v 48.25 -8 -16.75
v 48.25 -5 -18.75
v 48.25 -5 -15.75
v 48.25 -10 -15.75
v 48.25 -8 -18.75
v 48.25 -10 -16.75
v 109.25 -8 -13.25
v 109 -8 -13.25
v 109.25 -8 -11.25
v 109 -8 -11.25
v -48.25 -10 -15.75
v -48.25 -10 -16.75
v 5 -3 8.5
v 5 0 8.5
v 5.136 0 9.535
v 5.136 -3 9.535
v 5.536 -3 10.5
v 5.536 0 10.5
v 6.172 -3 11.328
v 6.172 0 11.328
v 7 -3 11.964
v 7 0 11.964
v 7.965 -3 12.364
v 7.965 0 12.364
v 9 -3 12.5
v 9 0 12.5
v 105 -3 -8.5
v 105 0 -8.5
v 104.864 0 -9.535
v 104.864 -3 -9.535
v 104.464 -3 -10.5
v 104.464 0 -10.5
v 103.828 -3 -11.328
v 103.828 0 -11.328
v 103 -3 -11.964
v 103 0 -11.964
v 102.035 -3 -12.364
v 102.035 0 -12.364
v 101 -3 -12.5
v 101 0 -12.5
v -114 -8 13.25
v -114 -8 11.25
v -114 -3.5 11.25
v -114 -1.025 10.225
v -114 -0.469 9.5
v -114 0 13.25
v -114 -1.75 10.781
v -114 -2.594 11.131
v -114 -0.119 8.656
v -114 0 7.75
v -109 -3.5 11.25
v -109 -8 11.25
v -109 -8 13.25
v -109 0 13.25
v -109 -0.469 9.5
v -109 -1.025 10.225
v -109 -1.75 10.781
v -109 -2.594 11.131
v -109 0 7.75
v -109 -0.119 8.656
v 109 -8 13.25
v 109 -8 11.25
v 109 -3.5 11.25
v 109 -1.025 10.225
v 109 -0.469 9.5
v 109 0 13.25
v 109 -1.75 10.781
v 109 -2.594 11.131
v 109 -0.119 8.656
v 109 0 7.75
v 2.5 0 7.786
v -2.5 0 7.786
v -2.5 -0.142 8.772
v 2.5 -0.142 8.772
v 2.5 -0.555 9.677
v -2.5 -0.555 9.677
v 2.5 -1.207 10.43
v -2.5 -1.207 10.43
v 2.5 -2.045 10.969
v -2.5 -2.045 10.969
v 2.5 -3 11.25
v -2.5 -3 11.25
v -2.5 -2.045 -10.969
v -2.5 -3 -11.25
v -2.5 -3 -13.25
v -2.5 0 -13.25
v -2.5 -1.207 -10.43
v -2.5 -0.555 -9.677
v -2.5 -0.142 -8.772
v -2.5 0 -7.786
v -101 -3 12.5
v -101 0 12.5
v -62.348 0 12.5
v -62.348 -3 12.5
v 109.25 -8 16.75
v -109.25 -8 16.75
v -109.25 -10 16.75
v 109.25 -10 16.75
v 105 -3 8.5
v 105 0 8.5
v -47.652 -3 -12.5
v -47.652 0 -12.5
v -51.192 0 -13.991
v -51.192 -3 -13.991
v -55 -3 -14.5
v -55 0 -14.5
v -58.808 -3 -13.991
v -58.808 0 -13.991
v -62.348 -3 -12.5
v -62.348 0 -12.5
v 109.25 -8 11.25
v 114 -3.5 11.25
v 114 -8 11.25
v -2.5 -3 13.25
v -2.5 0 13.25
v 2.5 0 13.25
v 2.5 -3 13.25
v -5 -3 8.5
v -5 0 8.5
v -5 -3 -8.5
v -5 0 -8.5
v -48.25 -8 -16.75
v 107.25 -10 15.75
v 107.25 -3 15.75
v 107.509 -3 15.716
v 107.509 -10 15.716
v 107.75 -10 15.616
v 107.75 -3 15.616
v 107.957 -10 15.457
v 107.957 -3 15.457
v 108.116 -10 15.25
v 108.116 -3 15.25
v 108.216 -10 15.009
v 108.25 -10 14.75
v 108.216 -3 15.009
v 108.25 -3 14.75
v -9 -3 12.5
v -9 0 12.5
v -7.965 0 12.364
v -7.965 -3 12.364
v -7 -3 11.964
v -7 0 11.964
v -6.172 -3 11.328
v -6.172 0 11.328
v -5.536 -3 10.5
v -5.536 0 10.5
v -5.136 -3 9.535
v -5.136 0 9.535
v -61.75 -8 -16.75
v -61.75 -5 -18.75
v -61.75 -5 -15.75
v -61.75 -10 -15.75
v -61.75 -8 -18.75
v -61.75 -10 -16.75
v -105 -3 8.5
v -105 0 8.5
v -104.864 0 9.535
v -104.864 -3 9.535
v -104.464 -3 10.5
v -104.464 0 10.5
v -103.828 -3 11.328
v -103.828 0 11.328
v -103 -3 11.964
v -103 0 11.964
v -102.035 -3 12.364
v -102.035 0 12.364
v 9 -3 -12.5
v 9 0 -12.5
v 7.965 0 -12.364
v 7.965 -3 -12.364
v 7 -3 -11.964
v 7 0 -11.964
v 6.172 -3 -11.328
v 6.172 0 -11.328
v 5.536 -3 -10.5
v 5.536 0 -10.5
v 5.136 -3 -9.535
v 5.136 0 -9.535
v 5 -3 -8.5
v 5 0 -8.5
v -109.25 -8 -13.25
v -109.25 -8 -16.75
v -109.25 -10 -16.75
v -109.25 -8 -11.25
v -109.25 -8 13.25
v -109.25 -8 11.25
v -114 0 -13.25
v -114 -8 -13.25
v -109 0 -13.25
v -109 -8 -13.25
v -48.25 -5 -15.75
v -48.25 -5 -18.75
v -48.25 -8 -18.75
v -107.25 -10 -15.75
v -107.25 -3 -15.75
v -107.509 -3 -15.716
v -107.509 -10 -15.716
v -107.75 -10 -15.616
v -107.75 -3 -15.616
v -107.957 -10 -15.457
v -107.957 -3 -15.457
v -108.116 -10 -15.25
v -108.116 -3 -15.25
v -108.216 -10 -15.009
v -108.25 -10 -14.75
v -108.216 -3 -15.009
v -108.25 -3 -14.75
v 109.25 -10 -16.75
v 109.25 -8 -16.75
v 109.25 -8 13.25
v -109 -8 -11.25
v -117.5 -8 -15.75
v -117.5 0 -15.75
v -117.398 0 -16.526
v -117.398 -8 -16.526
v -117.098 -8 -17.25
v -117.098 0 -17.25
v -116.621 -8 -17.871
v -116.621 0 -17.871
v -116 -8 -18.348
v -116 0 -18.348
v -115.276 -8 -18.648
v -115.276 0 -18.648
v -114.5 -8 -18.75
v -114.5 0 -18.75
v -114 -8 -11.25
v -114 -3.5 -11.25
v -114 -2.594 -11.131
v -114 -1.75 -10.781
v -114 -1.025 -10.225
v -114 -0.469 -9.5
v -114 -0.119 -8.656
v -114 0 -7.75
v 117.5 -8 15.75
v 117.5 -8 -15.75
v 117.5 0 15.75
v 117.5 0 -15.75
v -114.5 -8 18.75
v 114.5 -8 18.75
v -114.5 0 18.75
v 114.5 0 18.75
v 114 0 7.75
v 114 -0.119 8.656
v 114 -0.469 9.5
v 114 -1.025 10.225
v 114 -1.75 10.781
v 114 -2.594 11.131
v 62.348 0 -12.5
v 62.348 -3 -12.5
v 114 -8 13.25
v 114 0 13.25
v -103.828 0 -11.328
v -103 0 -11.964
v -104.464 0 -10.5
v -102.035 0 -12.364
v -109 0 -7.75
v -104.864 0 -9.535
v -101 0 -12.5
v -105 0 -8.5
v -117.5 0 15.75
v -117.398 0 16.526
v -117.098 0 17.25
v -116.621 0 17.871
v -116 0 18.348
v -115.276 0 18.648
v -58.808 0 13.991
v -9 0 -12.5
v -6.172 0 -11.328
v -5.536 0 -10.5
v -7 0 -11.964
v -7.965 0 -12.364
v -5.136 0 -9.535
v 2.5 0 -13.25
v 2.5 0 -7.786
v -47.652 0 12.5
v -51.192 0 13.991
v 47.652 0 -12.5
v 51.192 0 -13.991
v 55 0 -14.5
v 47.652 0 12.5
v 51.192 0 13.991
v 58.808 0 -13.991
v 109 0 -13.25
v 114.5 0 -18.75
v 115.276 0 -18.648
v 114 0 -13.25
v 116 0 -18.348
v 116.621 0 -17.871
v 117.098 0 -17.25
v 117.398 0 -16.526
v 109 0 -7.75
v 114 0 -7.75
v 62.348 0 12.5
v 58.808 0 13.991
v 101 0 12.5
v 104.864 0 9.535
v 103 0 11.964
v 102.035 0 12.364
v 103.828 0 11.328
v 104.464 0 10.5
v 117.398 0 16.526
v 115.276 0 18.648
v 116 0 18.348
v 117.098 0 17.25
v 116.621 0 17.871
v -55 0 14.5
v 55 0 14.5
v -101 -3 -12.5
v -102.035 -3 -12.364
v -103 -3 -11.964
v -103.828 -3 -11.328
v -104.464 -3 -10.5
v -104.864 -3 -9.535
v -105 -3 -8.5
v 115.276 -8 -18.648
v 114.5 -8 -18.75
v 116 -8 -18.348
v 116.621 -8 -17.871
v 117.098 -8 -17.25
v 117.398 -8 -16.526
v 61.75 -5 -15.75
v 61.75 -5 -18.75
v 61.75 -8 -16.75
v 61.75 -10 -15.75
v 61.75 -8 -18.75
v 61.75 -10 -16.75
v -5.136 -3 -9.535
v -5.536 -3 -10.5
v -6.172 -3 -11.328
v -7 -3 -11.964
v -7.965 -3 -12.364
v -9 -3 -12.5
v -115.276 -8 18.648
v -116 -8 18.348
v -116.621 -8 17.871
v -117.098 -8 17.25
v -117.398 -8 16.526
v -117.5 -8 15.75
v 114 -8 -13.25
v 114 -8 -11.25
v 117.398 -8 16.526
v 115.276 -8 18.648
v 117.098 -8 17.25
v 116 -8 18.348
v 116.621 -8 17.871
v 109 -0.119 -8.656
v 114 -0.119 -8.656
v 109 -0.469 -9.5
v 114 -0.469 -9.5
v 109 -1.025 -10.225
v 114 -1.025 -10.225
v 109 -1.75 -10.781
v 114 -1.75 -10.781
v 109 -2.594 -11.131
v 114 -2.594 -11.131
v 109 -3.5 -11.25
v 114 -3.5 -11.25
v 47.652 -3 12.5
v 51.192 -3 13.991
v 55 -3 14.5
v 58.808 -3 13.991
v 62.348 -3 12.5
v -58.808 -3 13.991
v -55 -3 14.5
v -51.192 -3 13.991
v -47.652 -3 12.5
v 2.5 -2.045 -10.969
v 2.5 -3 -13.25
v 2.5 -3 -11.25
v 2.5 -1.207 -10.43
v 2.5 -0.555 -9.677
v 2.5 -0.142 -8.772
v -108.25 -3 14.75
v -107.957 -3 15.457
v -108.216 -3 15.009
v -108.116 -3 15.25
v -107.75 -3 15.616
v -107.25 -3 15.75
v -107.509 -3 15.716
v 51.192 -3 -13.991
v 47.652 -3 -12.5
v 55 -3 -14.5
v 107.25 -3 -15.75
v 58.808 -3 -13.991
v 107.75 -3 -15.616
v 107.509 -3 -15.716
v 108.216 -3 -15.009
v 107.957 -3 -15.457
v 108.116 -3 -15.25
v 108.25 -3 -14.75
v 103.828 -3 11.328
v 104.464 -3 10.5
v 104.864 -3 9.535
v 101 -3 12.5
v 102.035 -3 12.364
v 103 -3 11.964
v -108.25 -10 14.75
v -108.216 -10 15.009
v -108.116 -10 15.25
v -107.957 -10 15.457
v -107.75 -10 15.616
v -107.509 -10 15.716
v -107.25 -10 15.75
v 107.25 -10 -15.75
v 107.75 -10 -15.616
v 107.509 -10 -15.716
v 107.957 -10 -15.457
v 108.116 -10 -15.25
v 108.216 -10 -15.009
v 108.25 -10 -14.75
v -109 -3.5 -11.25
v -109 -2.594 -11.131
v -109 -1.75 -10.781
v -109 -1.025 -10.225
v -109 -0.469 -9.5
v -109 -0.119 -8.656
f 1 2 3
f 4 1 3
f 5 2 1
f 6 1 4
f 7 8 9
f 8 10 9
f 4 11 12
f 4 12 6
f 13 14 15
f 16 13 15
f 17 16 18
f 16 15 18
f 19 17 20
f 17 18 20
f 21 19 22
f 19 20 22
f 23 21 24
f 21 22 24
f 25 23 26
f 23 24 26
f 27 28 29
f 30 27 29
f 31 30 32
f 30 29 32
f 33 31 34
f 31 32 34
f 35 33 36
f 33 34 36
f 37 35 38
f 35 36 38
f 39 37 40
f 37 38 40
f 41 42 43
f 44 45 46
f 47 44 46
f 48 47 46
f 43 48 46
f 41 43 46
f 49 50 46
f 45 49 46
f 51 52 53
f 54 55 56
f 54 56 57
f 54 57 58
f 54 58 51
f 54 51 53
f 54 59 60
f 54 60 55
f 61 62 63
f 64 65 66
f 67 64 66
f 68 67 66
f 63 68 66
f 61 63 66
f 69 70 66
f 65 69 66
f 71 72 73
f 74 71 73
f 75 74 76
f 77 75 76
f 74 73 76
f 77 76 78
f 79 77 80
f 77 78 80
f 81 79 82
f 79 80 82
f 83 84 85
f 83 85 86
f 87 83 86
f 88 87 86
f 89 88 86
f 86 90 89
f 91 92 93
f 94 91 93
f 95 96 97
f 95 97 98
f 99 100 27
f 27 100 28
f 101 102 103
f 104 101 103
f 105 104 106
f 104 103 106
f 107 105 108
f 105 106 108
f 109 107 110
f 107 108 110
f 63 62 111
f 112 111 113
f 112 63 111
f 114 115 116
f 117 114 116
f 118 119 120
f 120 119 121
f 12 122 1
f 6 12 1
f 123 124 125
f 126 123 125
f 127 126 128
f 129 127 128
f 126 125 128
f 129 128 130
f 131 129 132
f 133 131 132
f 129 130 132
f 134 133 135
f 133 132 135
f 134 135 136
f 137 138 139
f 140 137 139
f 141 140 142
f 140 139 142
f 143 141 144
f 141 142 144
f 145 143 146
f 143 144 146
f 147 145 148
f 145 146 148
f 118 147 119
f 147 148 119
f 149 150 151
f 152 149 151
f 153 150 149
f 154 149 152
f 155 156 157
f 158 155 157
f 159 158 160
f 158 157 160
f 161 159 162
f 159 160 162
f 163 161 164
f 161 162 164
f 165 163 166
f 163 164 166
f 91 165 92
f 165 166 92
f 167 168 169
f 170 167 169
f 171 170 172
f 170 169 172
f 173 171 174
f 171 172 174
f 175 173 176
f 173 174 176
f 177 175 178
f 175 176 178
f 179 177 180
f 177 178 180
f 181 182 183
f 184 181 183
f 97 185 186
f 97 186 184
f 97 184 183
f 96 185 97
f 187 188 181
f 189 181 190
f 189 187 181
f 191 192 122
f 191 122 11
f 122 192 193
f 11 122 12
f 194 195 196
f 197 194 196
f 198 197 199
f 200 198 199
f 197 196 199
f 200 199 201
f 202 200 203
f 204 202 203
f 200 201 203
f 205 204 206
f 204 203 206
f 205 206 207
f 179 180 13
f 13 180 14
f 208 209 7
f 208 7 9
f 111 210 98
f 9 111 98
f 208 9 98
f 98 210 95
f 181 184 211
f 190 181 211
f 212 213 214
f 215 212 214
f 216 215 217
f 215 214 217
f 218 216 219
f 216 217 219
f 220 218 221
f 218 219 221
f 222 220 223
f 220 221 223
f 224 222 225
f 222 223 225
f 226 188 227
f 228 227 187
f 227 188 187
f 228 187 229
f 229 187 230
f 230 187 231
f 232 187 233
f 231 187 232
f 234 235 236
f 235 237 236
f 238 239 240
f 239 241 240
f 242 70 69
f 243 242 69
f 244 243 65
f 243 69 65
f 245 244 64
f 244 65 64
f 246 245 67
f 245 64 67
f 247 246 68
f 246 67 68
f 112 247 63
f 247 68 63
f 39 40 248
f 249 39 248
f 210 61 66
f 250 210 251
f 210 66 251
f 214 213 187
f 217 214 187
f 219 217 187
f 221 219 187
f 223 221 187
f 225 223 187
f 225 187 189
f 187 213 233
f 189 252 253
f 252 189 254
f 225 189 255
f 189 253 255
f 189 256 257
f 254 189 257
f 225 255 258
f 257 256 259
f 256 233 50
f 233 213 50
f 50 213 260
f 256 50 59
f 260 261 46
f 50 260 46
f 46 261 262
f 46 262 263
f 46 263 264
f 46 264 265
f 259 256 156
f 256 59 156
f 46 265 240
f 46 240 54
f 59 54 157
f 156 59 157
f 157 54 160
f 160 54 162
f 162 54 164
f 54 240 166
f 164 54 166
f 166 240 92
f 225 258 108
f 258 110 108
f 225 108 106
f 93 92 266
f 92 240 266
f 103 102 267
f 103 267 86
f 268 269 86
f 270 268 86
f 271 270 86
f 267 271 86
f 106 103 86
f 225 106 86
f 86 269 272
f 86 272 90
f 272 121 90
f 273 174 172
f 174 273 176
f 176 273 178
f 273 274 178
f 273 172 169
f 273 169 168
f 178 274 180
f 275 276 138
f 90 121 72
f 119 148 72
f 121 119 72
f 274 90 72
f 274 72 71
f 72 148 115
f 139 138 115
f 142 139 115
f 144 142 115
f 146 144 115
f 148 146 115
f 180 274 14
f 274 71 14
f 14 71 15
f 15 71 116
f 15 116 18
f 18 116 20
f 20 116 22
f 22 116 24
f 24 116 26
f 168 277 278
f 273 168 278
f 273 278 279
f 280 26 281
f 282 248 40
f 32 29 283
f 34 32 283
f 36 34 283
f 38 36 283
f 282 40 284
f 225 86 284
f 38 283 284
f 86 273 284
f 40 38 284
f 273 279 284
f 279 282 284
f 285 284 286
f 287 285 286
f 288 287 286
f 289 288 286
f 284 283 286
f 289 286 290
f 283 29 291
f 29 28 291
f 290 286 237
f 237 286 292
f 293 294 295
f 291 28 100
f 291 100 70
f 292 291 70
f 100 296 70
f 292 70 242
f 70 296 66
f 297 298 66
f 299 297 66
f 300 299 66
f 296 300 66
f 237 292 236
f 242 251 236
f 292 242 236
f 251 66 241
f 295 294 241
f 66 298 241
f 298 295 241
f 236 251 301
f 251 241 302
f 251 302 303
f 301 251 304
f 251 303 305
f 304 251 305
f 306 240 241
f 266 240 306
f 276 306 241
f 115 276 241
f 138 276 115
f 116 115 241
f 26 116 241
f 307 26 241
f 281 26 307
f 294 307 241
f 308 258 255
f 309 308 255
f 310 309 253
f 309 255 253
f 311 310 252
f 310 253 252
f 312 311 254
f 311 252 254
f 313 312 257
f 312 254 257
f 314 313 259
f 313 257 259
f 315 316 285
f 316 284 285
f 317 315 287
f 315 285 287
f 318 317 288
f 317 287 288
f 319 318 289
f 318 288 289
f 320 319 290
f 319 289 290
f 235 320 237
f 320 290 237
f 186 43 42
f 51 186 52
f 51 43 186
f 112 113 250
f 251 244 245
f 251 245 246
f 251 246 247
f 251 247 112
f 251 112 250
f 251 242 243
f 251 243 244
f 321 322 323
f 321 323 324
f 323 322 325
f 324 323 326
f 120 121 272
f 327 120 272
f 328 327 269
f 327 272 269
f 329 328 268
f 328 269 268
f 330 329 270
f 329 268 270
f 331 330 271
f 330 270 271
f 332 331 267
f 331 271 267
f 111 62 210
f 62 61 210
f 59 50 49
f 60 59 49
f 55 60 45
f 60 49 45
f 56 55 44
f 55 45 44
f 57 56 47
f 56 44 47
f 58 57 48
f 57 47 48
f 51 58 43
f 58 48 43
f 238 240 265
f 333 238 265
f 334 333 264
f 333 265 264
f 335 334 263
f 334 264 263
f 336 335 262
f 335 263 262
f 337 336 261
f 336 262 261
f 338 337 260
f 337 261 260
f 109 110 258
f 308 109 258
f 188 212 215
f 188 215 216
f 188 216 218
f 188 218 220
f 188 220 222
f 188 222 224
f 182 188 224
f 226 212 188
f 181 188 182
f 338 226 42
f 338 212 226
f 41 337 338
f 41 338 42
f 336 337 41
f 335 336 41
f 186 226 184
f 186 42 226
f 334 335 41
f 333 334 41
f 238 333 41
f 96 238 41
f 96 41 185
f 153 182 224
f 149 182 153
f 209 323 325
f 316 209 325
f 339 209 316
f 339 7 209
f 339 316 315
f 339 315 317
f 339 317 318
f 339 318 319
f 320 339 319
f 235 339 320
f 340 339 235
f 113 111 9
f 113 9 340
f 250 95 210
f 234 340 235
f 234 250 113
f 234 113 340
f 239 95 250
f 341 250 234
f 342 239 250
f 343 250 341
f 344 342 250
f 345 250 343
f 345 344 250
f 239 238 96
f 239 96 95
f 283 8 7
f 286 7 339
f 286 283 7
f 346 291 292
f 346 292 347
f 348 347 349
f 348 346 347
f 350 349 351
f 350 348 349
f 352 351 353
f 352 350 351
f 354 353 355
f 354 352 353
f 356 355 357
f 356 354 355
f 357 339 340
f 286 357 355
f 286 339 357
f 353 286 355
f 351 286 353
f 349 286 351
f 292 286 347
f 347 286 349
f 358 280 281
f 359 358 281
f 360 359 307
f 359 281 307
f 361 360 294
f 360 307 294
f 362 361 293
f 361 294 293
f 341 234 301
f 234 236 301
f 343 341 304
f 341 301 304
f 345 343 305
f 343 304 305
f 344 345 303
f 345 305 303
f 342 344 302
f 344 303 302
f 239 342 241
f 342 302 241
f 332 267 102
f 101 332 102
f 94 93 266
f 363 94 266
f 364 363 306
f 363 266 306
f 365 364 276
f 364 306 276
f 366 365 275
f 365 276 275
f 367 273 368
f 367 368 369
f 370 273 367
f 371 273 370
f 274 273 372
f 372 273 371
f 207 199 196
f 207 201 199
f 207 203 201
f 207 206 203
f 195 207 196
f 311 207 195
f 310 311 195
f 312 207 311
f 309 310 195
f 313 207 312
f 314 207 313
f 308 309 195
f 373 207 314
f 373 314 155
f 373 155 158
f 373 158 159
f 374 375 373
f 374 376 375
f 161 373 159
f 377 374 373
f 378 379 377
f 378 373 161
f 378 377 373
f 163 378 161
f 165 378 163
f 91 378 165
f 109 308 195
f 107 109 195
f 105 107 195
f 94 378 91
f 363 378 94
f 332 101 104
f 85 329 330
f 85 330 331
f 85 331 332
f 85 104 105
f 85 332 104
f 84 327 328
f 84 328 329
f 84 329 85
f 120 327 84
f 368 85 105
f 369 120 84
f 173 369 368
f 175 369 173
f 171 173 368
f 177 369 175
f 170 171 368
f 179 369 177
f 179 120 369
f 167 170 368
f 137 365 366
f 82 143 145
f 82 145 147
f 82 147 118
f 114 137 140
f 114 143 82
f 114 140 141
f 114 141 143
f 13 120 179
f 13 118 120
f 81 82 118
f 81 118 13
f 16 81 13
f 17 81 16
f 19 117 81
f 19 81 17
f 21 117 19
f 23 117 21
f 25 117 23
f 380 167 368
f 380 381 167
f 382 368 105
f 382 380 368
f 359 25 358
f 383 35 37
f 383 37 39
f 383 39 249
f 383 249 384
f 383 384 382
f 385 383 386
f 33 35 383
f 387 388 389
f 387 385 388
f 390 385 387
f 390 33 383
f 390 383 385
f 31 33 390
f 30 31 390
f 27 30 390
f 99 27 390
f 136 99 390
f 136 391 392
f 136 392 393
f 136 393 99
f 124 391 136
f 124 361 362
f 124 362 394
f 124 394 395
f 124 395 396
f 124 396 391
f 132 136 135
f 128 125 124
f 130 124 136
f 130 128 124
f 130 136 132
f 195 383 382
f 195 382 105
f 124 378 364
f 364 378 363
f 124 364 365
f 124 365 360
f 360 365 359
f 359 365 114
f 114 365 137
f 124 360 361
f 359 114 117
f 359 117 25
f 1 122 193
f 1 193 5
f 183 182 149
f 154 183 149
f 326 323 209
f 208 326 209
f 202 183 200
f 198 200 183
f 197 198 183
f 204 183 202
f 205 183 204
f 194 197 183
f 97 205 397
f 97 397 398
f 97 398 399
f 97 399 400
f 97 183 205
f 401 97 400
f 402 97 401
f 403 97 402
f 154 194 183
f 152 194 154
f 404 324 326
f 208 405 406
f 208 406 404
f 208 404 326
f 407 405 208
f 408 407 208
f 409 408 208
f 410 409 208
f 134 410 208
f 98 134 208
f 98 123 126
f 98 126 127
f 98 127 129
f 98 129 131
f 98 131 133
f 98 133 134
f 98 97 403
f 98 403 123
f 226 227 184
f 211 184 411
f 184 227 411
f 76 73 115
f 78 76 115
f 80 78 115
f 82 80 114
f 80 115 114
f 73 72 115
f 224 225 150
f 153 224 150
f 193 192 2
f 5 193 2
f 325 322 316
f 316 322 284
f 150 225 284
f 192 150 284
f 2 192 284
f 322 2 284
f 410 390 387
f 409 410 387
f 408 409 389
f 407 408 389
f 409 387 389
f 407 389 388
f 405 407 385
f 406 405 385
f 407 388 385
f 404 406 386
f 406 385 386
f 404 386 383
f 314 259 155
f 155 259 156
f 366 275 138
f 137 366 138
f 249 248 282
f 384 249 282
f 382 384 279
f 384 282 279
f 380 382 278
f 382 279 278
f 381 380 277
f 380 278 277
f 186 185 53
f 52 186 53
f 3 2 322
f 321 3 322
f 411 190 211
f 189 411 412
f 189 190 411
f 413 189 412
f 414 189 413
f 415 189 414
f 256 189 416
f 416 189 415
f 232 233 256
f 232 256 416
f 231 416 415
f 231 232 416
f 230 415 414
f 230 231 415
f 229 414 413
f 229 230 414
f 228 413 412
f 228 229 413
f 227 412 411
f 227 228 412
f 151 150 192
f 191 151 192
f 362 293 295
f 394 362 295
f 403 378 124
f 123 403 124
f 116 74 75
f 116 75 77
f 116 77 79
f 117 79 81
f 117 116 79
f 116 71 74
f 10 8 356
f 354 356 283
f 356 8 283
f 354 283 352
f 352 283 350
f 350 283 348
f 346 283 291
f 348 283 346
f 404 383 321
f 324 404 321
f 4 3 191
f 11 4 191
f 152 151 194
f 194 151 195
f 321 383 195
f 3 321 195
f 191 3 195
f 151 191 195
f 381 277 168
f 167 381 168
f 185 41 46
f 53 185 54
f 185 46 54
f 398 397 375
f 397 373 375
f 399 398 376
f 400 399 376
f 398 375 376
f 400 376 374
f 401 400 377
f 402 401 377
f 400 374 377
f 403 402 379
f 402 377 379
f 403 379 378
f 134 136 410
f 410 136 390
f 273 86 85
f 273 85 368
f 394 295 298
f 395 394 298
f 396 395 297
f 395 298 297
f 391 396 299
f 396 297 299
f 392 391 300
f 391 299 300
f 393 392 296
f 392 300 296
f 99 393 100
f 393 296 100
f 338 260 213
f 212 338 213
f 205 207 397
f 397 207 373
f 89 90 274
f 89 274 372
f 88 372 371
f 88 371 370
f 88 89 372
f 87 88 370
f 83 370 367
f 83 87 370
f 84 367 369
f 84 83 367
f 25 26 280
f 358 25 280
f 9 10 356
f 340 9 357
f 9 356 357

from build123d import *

# Parameters (mm, degrees)
F0_W        = 5
F0_H        = 2
F1_DEPTH    = 3
F2_W        = 5
F2_H        = 2
F3_DEPTH    = 5
F4_W        = 218.5
F4_H        = 33.5
F5_DEPTH    = 2
F6_W        = 13.5
F6_H        = 5
F7_DEPTH    = 25
F8_T1_DEPTH = 5
F8_T3_DEPTH = 5
F8_T5_DEPTH = 5


# Not quite as in the source:
# - a fillet or chamfer that OpenCascade refuses, or shapes differently, is made with other operations: its cross-section is extruded or revolved along the edge and cut away or added
# - a feature names something its author has since deleted; it is built from what else it names


with BuildPart() as f1:
    # F0 (on Front) → F1 (new body)
    with BuildSketch(Plane.XZ):
        with BuildLine():
            ThreePointArc((117.5, 15.75), (116.6213203436, 17.8713203436), (114.5, 18.75))
            Line((114.5, 18.75), (-114.5, 18.75))
            ThreePointArc((-114.5, 18.75), (-116.6213203436, 17.8713203436), (-117.5, 15.75))
            Line((-117.5, 15.75), (-117.5, -15.75))
            ThreePointArc((-117.5, -15.75), (-116.6213203436, -17.8713203436), (-114.5, -18.75))
            Line((-114.5, -18.75), (114.5, -18.75))
            ThreePointArc((114.5, -18.75), (116.6213203436, -17.8713203436), (117.5, -15.75))
            Line((117.5, -15.75), (117.5, 15.75))
        make_face()
        with Locations((-111.5, -12.25)):
            Rectangle(F0_W, F0_H, mode=Mode.SUBTRACT)
        with BuildLine():
            Line((-47.6515307717, 12.5), (-9, 12.5))
            ThreePointArc((-9, 12.5), (-6.1715728753, 11.3284271247), (-5, 8.5))
            Line((-5, 8.5), (-5, -8.5))
            ThreePointArc((-5, -8.5), (-6.1715728753, -11.3284271247), (-9, -12.5))
            Line((-9, -12.5), (-47.6515307717, -12.5))
            ThreePointArc((-47.6515307717, -12.5), (-55, -14.5), (-62.3484692283, -12.5))
            Line((-62.3484692284, -12.5), (-101, -12.5))
            ThreePointArc((-101, -12.5), (-103.8284271247, -11.3284271247), (-105, -8.5))
            Line((-105, -8.5), (-105, 8.5))
            ThreePointArc((-105, 8.5), (-103.8284271247, 11.3284271247), (-101, 12.5))
            Line((-101, 12.5), (-62.3484692284, 12.5))
            ThreePointArc((-62.3484692283, 12.5), (-55, 14.5), (-47.6515307717, 12.5))
        make_face(mode=Mode.SUBTRACT)
        with Locations((0, -12.25)):
            Rectangle(F0_W, F0_H, mode=Mode.SUBTRACT)
        with Locations((111.5, -12.25)):
            Rectangle(F0_W, F0_H, mode=Mode.SUBTRACT)
        with BuildLine():
            Line((62.3484692283, 12.5), (101, 12.5))
            ThreePointArc((101, 12.5), (103.8284271247, 11.3284271247), (105, 8.5))
            Line((105, 8.5), (105, -8.5))
            ThreePointArc((105, -8.5), (103.8284271247, -11.3284271247), (101, -12.5))
            Line((101, -12.5), (62.3484692283, -12.5))
            ThreePointArc((62.3484692283, -12.5), (55, -14.5), (47.6515307717, -12.5))
            Line((47.6515307716, -12.5), (9, -12.5))
            ThreePointArc((9, -12.5), (6.1715728753, -11.3284271247), (5, -8.5))
            Line((5, -8.5), (5, 8.5))
            ThreePointArc((5, 8.5), (6.1715728753, 11.3284271247), (9, 12.5))
            Line((9, 12.5), (47.6515307716, 12.5))
            ThreePointArc((47.6515307717, 12.5), (55, 14.5), (62.3484692283, 12.5))
        make_face(mode=Mode.SUBTRACT)
        with Locations((-111.5, 12.25)):
            Rectangle(F0_W, F0_H, mode=Mode.SUBTRACT)
        with Locations((0, 12.25)):
            Rectangle(F0_W, F0_H, mode=Mode.SUBTRACT)
        with Locations((111.5, 12.25)):
            Rectangle(F0_W, F0_H, mode=Mode.SUBTRACT)
    extrude(amount=F1_DEPTH)

    # F2 (on face) → F3 (join)
    with BuildSketch(Plane.XZ.offset(3)):
        with BuildLine():
            Line((-114.5, -18.75), (114.5, -18.75))
            ThreePointArc((114.5, -18.75), (116.6213203436, -17.8713203436), (117.5, -15.75))
            Line((117.5, -15.75), (117.5, 15.75))
            ThreePointArc((117.5, 15.75), (116.6213203436, 17.8713203436), (114.5, 18.75))
            Line((114.5, 18.75), (-114.5, 18.75))
            ThreePointArc((-114.5, 18.75), (-116.6213203436, 17.8713203436), (-117.5, 15.75))
            Line((-117.5, 15.75), (-117.5, -15.75))
            ThreePointArc((-117.5, -15.75), (-116.6213203436, -17.8713203436), (-114.5, -18.75))
        make_face()
        with Locations((-111.5, -12.25)):
            Rectangle(F2_W, F2_H, mode=Mode.SUBTRACT)
        with Locations((111.5, -12.25)):
            Rectangle(F2_W, F2_H, mode=Mode.SUBTRACT)
        with Locations((-111.5, 12.25)):
            Rectangle(F2_W, F2_H, mode=Mode.SUBTRACT)
        with BuildLine():
            Line((-107.25, 15.75), (107.25, 15.75))
            ThreePointArc((107.25, 15.75), (107.9571067812, 15.4571067812), (108.25, 14.75))
            Line((108.25, 14.75), (108.25, -14.75))
            ThreePointArc((108.25, -14.75), (107.9571067812, -15.4571067812), (107.25, -15.75))
            Line((107.25, -15.75), (-107.25, -15.75))
            ThreePointArc((-107.25, -15.75), (-107.9571067812, -15.4571067812), (-108.25, -14.75))
            Line((-108.25, -14.75), (-108.25, 14.75))
            ThreePointArc((-108.25, 14.75), (-107.9571067812, 15.4571067812), (-107.25, 15.75))
        make_face(mode=Mode.SUBTRACT)
        with Locations((111.5, 12.25)):
            Rectangle(F2_W, F2_H, mode=Mode.SUBTRACT)
    extrude(amount=F3_DEPTH)

    # F4 (on face) → F5 (join)
    with BuildSketch(Plane.XZ.offset(8)):
        Rectangle(F4_W, F4_H)
        with BuildLine():
            ThreePointArc((-108.25, 14.75), (-107.9571067812, 15.4571067812), (-107.25, 15.75))
            Line((-107.25, 15.75), (107.25, 15.75))
            ThreePointArc((107.25, 15.75), (107.9571067812, 15.4571067812), (108.25, 14.75))
            Line((108.25, 14.75), (108.25, -14.75))
            ThreePointArc((108.25, -14.75), (107.9571067812, -15.4571067812), (107.25, -15.75))
            Line((107.25, -15.75), (-107.25, -15.75))
            ThreePointArc((-107.25, -15.75), (-107.9571067812, -15.4571067812), (-108.25, -14.75))
            Line((-108.25, -14.75), (-108.25, 14.75))
        make_face(mode=Mode.SUBTRACT)
    extrude(amount=F5_DEPTH)

    # F6 (on face) → F7 (cut)
    with BuildSketch(Plane(origin=(0, 0, -18.75), x_dir=(1, 0, 0), z_dir=(0, 0, -1))):
        with Locations((-55, 7.5)):
            Rectangle(F6_W, F6_H)
        with Locations((55, 7.5)):
            Rectangle(F6_W, F6_H)
    extrude(amount=-F7_DEPTH, mode=Mode.SUBTRACT)

    # F8: fillet of radius 3.5 on 6 edges, made by hand

    # F8_s2 → F8_t1 (cut)
    with BuildSketch(Plane.YZ.offset(-2.5)):
        with BuildLine():
            ThreePointArc((0, 7.7858983849), (-0.8542486889, 10.0771862323), (-3, 11.25))
            Line((-3, 11.25), (0, 11.25))
            Line((0, 11.25), (0, 7.7858983849))
        make_face()
        with BuildLine():
            ThreePointArc((0, -7.7858983849), (-0.8542486889, -10.0771862323), (-3, -11.25))
            Line((-3, -11.25), (0, -11.25))
            Line((0, -11.25), (0, -7.7858983849))
        make_face()
    extrude(amount=F8_T1_DEPTH, mode=Mode.SUBTRACT)

    # F8_s4 → F8_t3 (cut)
    with BuildSketch(Plane.YZ.offset(109)):
        with BuildLine():
            ThreePointArc((0, 7.75), (-1.0251262658, 10.2248737342), (-3.5, 11.25))
            Line((-3.5, 11.25), (0, 11.25))
            Line((0, 11.25), (0, 7.75))
        make_face()
        with BuildLine():
            ThreePointArc((0, -7.75), (-1.0251262658, -10.2248737342), (-3.5, -11.25))
            Line((-3.5, -11.25), (0, -11.25))
            Line((0, -11.25), (0, -7.75))
        make_face()
    extrude(amount=F8_T3_DEPTH, mode=Mode.SUBTRACT)

    # F8_s6 → F8_t5 (cut)
    with BuildSketch(Plane.YZ.offset(-114)):
        with BuildLine():
            ThreePointArc((0, 7.75), (-1.0251262658, 10.2248737342), (-3.5, 11.25))
            Line((-3.5, 11.25), (0, 11.25))
            Line((0, 11.25), (0, 7.75))
        make_face()
        with BuildLine():
            ThreePointArc((0, -7.75), (-1.0251262658, -10.2248737342), (-3.5, -11.25))
            Line((-3.5, -11.25), (0, -11.25))
            Line((0, -11.25), (0, -7.75))
        make_face()
    extrude(amount=F8_T5_DEPTH, mode=Mode.SUBTRACT)


solid = f1.part
